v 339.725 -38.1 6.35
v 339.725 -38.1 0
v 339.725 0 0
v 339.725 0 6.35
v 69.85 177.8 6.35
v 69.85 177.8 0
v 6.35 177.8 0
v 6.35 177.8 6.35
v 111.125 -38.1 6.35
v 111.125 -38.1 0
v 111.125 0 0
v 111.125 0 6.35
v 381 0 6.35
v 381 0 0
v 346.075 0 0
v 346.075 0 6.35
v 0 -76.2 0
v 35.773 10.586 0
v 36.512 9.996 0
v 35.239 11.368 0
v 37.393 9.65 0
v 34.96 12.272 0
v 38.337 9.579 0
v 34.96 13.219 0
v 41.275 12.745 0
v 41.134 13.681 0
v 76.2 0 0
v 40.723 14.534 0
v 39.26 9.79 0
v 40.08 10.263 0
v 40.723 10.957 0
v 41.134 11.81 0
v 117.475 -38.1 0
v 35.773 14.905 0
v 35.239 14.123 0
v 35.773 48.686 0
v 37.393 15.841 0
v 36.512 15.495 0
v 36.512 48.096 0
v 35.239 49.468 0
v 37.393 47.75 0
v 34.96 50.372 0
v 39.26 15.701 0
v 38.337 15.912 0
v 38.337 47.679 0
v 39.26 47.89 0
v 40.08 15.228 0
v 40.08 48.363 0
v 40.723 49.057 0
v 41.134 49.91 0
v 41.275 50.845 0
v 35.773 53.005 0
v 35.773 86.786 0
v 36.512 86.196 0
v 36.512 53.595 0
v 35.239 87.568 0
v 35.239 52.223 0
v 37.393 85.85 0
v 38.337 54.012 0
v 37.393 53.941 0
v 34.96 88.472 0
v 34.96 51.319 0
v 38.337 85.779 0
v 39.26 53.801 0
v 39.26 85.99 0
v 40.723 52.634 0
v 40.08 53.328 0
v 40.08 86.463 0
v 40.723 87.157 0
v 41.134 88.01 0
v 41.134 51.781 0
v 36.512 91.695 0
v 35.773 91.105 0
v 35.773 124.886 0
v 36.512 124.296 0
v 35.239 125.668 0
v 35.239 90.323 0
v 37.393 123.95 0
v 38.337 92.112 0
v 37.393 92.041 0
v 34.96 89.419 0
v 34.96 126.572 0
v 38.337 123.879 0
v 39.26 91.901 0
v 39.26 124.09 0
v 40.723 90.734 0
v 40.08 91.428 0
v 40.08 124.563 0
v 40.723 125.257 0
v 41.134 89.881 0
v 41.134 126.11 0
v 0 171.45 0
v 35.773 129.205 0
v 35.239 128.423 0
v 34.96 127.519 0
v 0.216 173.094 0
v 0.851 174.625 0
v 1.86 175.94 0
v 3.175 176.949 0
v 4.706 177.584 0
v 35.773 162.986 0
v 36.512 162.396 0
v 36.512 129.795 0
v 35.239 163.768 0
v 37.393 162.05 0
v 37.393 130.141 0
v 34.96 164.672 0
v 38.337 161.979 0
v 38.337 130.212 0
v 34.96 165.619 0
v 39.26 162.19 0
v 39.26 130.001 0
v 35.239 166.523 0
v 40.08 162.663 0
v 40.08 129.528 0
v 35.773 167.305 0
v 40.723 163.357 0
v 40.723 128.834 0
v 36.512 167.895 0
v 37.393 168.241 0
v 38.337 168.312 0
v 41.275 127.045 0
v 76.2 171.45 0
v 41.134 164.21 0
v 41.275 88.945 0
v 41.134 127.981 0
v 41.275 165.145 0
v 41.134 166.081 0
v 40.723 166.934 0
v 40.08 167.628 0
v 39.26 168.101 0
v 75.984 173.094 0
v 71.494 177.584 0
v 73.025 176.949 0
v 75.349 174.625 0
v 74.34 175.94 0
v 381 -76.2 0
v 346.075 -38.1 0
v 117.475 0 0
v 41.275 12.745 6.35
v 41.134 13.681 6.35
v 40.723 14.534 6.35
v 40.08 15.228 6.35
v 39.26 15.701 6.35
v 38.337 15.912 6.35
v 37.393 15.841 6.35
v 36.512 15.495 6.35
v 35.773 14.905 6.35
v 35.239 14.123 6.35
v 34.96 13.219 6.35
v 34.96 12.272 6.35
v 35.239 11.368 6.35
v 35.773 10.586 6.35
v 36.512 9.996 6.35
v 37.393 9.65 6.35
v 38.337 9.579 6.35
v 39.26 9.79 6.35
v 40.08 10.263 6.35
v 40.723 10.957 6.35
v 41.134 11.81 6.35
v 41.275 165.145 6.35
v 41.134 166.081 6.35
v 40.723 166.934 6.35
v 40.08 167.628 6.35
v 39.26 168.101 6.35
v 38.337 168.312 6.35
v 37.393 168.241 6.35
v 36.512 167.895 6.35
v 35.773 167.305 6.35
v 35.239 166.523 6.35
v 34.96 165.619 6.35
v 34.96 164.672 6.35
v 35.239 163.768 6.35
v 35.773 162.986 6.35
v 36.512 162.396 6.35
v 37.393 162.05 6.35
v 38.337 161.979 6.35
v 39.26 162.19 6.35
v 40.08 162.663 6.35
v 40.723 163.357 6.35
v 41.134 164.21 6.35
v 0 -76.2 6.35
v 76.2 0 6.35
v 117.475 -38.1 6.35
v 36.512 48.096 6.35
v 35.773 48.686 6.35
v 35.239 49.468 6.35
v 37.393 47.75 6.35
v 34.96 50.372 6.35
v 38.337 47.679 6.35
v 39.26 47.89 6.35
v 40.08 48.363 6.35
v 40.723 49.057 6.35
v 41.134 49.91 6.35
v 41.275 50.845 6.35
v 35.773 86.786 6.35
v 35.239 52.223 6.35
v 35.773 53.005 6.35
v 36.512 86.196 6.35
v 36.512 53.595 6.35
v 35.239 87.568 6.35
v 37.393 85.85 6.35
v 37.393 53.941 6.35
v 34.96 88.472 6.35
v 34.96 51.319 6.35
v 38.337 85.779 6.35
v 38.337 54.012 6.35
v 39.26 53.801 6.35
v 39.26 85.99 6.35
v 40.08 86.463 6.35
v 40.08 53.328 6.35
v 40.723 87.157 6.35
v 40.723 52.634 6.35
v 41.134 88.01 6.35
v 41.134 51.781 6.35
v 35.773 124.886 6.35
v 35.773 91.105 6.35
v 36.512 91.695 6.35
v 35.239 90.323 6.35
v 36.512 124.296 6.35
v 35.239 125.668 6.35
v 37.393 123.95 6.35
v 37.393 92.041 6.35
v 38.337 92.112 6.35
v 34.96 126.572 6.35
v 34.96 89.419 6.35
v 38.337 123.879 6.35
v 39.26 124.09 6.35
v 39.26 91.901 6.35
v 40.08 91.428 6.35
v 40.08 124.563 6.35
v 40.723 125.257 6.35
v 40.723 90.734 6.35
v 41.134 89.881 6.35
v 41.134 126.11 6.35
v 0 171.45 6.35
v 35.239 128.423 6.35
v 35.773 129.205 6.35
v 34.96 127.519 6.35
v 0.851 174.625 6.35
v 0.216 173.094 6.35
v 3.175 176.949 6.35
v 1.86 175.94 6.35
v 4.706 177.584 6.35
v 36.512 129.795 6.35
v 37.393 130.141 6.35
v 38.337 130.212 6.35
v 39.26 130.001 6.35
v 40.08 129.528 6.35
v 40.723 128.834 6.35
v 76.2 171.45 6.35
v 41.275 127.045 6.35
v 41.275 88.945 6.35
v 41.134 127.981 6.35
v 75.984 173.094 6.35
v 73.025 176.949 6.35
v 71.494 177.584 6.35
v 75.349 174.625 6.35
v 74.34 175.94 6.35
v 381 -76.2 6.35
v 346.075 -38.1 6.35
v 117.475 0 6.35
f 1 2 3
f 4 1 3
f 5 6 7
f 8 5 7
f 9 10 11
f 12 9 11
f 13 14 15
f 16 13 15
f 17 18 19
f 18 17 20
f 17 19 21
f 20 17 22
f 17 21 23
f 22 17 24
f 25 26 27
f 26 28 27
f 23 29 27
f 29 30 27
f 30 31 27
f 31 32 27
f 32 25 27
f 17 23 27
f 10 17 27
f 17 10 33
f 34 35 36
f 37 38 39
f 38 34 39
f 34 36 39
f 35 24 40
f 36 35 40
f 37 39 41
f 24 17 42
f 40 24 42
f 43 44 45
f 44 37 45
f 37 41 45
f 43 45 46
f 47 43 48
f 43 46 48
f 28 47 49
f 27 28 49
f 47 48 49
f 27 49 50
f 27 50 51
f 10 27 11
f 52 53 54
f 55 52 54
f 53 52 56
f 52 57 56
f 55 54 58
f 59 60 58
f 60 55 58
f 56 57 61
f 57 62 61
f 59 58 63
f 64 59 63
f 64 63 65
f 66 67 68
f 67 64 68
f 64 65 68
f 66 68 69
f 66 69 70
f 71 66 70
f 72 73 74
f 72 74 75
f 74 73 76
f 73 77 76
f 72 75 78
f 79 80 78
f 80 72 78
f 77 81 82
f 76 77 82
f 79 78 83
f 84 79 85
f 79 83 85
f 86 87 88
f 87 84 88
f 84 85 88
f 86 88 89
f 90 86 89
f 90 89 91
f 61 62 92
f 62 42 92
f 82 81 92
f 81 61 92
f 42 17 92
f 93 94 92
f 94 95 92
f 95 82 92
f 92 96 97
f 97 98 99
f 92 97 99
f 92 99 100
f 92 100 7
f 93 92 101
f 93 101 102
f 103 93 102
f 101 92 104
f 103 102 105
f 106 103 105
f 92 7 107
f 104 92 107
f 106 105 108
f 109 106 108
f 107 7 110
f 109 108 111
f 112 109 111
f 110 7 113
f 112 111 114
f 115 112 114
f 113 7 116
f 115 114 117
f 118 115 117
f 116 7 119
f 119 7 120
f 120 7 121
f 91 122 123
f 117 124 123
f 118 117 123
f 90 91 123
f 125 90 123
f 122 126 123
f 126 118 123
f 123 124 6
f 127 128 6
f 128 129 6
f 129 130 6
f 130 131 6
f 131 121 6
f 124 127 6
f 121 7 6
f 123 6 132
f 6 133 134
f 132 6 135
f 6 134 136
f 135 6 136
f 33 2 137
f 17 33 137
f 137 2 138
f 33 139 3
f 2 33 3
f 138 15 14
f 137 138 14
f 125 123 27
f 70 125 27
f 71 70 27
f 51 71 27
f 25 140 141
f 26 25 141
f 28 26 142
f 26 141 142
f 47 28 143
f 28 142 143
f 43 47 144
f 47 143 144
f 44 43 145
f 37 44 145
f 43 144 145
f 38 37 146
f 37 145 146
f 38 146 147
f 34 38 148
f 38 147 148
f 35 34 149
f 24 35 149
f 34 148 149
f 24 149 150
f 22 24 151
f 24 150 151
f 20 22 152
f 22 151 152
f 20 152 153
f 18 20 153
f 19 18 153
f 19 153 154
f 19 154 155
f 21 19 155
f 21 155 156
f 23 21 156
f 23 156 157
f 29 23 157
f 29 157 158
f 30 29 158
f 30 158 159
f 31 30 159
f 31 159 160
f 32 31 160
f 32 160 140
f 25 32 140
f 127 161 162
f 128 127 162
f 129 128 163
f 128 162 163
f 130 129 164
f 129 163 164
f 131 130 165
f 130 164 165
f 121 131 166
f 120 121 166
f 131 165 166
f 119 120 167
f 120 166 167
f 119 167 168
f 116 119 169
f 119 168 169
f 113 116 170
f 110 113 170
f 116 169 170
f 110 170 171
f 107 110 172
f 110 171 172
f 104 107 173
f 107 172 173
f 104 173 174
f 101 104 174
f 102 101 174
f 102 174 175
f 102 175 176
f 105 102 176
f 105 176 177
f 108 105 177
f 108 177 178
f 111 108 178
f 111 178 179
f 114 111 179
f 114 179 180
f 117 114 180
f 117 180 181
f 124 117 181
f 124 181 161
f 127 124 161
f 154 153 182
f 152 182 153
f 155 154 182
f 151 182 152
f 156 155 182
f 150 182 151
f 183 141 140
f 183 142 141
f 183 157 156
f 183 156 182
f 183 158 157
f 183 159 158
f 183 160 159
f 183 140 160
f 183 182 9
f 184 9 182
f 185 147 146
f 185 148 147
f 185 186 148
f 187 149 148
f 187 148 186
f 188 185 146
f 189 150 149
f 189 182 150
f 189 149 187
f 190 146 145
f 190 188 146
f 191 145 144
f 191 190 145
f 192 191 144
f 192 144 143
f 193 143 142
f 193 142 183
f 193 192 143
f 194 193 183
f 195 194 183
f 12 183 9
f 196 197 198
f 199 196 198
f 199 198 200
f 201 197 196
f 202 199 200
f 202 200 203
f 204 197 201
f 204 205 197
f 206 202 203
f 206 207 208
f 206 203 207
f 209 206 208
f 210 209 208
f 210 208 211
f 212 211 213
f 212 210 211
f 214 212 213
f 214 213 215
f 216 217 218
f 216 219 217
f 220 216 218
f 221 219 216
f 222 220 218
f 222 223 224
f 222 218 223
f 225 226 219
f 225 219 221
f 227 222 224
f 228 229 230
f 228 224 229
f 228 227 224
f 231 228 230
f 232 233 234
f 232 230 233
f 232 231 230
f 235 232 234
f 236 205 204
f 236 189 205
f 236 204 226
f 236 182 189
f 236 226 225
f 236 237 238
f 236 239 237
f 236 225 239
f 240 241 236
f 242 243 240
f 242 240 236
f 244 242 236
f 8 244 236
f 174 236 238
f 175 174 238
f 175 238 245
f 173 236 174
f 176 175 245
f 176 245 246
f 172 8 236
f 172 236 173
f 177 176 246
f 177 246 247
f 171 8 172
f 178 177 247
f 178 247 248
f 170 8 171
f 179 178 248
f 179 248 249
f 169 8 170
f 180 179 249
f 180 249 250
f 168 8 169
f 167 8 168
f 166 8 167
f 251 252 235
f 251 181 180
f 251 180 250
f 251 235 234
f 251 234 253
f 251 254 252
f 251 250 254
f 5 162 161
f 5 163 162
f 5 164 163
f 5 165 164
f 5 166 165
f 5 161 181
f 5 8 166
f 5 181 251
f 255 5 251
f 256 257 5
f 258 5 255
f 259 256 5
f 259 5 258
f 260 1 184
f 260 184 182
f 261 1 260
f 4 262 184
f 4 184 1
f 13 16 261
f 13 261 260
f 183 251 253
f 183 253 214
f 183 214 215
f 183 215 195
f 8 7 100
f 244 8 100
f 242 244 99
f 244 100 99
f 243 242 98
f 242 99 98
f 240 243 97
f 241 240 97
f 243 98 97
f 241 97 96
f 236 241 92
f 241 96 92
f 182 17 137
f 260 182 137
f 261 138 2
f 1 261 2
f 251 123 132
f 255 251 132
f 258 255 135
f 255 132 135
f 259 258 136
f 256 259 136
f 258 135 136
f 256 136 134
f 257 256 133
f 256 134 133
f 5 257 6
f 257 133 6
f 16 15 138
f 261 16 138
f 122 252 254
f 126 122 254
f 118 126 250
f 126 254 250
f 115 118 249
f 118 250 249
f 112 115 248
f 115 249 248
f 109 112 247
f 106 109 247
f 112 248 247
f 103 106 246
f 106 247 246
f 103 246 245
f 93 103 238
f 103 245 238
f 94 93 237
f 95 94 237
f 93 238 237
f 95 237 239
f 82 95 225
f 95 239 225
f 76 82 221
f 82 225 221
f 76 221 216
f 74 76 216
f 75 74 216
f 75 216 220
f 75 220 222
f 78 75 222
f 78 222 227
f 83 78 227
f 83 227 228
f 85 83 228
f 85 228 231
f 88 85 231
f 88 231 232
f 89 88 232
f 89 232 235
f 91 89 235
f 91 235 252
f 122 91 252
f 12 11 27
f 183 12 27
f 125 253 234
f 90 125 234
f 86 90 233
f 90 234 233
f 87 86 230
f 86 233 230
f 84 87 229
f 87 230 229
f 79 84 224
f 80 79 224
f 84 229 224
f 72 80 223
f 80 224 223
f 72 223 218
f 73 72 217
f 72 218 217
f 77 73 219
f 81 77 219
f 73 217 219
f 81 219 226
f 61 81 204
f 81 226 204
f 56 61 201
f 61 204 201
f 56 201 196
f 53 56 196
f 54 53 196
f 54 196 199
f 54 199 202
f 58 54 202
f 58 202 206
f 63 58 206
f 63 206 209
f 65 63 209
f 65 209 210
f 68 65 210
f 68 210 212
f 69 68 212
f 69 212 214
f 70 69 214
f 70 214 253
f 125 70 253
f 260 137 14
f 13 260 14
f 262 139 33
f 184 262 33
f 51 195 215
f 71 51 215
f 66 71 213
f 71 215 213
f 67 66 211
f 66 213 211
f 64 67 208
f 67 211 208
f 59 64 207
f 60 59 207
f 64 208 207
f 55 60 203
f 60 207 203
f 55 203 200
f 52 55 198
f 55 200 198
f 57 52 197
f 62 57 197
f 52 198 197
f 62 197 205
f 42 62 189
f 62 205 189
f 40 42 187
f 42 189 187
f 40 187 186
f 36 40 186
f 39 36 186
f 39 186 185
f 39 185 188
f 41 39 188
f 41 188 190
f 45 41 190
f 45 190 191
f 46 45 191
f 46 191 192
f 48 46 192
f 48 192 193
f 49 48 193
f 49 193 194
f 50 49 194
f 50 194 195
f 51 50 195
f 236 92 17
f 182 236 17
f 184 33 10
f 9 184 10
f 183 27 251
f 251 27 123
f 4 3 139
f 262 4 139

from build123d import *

# Parameters (mm, degrees)
F0_W     = 76.2
F0_H     = 76.2
F1_DEPTH = 6.35
F2_R     = 3.175
F3_DEPTH = 25.4


# Not quite as in the source:
# - a feature names something its author has since deleted; it is built from what else it names


with BuildPart() as f1:
    # F0 (on Top) → F1 (new body)
    with BuildSketch(Plane.XY):
        with BuildLine():
            Line((0, 0), (76.2, 0))
            Line((76.2, 0), (76.2, 171.45))
            ThreePointArc((76.2, 171.45), (74.3401280605, 175.9401280605), (69.85, 177.8))
            Line((69.85, 177.8), (6.35, 177.8))
            ThreePointArc((6.35, 177.8), (1.8598719395, 175.9401280605), (0, 171.45))
            Line((0, 171.45), (0, 0))
        make_face()
        with Locations((38.1, -38.1)):
            Rectangle(F0_W, F0_H)
        Polygon((111.125, -38.1), (111.125, 0), (76.2, 0), (76.2, -76.2), (250.825, -76.2), (257.175, -76.2), (381, -76.2), (381, 0), (346.075, 0), (346.075, -38.1), (342.9, -38.1), (339.725, -38.1), (339.725, 0), (257.175, 0), (250.825, 0), (117.475, 0), (117.475, -38.1), (114.3, -38.1), align=None)
    extrude(amount=F1_DEPTH)

    # F2 (on face) → F3 (cut)
    with BuildSketch(Plane.XY.offset(6.35)):
        with Locations((38.1, 12.7454660833)):
            Circle(F2_R)
        with Locations((38.1, 50.8454660833)):
            Circle(F2_R)
        with Locations((38.1, 88.9454660833)):
            Circle(F2_R)
        with Locations((38.1, 127.0454660833)):
            Circle(F2_R)
        with Locations((38.1, 165.1454660833)):
            Circle(F2_R)
    extrude(amount=-F3_DEPTH, mode=Mode.SUBTRACT)


solid = f1.part
